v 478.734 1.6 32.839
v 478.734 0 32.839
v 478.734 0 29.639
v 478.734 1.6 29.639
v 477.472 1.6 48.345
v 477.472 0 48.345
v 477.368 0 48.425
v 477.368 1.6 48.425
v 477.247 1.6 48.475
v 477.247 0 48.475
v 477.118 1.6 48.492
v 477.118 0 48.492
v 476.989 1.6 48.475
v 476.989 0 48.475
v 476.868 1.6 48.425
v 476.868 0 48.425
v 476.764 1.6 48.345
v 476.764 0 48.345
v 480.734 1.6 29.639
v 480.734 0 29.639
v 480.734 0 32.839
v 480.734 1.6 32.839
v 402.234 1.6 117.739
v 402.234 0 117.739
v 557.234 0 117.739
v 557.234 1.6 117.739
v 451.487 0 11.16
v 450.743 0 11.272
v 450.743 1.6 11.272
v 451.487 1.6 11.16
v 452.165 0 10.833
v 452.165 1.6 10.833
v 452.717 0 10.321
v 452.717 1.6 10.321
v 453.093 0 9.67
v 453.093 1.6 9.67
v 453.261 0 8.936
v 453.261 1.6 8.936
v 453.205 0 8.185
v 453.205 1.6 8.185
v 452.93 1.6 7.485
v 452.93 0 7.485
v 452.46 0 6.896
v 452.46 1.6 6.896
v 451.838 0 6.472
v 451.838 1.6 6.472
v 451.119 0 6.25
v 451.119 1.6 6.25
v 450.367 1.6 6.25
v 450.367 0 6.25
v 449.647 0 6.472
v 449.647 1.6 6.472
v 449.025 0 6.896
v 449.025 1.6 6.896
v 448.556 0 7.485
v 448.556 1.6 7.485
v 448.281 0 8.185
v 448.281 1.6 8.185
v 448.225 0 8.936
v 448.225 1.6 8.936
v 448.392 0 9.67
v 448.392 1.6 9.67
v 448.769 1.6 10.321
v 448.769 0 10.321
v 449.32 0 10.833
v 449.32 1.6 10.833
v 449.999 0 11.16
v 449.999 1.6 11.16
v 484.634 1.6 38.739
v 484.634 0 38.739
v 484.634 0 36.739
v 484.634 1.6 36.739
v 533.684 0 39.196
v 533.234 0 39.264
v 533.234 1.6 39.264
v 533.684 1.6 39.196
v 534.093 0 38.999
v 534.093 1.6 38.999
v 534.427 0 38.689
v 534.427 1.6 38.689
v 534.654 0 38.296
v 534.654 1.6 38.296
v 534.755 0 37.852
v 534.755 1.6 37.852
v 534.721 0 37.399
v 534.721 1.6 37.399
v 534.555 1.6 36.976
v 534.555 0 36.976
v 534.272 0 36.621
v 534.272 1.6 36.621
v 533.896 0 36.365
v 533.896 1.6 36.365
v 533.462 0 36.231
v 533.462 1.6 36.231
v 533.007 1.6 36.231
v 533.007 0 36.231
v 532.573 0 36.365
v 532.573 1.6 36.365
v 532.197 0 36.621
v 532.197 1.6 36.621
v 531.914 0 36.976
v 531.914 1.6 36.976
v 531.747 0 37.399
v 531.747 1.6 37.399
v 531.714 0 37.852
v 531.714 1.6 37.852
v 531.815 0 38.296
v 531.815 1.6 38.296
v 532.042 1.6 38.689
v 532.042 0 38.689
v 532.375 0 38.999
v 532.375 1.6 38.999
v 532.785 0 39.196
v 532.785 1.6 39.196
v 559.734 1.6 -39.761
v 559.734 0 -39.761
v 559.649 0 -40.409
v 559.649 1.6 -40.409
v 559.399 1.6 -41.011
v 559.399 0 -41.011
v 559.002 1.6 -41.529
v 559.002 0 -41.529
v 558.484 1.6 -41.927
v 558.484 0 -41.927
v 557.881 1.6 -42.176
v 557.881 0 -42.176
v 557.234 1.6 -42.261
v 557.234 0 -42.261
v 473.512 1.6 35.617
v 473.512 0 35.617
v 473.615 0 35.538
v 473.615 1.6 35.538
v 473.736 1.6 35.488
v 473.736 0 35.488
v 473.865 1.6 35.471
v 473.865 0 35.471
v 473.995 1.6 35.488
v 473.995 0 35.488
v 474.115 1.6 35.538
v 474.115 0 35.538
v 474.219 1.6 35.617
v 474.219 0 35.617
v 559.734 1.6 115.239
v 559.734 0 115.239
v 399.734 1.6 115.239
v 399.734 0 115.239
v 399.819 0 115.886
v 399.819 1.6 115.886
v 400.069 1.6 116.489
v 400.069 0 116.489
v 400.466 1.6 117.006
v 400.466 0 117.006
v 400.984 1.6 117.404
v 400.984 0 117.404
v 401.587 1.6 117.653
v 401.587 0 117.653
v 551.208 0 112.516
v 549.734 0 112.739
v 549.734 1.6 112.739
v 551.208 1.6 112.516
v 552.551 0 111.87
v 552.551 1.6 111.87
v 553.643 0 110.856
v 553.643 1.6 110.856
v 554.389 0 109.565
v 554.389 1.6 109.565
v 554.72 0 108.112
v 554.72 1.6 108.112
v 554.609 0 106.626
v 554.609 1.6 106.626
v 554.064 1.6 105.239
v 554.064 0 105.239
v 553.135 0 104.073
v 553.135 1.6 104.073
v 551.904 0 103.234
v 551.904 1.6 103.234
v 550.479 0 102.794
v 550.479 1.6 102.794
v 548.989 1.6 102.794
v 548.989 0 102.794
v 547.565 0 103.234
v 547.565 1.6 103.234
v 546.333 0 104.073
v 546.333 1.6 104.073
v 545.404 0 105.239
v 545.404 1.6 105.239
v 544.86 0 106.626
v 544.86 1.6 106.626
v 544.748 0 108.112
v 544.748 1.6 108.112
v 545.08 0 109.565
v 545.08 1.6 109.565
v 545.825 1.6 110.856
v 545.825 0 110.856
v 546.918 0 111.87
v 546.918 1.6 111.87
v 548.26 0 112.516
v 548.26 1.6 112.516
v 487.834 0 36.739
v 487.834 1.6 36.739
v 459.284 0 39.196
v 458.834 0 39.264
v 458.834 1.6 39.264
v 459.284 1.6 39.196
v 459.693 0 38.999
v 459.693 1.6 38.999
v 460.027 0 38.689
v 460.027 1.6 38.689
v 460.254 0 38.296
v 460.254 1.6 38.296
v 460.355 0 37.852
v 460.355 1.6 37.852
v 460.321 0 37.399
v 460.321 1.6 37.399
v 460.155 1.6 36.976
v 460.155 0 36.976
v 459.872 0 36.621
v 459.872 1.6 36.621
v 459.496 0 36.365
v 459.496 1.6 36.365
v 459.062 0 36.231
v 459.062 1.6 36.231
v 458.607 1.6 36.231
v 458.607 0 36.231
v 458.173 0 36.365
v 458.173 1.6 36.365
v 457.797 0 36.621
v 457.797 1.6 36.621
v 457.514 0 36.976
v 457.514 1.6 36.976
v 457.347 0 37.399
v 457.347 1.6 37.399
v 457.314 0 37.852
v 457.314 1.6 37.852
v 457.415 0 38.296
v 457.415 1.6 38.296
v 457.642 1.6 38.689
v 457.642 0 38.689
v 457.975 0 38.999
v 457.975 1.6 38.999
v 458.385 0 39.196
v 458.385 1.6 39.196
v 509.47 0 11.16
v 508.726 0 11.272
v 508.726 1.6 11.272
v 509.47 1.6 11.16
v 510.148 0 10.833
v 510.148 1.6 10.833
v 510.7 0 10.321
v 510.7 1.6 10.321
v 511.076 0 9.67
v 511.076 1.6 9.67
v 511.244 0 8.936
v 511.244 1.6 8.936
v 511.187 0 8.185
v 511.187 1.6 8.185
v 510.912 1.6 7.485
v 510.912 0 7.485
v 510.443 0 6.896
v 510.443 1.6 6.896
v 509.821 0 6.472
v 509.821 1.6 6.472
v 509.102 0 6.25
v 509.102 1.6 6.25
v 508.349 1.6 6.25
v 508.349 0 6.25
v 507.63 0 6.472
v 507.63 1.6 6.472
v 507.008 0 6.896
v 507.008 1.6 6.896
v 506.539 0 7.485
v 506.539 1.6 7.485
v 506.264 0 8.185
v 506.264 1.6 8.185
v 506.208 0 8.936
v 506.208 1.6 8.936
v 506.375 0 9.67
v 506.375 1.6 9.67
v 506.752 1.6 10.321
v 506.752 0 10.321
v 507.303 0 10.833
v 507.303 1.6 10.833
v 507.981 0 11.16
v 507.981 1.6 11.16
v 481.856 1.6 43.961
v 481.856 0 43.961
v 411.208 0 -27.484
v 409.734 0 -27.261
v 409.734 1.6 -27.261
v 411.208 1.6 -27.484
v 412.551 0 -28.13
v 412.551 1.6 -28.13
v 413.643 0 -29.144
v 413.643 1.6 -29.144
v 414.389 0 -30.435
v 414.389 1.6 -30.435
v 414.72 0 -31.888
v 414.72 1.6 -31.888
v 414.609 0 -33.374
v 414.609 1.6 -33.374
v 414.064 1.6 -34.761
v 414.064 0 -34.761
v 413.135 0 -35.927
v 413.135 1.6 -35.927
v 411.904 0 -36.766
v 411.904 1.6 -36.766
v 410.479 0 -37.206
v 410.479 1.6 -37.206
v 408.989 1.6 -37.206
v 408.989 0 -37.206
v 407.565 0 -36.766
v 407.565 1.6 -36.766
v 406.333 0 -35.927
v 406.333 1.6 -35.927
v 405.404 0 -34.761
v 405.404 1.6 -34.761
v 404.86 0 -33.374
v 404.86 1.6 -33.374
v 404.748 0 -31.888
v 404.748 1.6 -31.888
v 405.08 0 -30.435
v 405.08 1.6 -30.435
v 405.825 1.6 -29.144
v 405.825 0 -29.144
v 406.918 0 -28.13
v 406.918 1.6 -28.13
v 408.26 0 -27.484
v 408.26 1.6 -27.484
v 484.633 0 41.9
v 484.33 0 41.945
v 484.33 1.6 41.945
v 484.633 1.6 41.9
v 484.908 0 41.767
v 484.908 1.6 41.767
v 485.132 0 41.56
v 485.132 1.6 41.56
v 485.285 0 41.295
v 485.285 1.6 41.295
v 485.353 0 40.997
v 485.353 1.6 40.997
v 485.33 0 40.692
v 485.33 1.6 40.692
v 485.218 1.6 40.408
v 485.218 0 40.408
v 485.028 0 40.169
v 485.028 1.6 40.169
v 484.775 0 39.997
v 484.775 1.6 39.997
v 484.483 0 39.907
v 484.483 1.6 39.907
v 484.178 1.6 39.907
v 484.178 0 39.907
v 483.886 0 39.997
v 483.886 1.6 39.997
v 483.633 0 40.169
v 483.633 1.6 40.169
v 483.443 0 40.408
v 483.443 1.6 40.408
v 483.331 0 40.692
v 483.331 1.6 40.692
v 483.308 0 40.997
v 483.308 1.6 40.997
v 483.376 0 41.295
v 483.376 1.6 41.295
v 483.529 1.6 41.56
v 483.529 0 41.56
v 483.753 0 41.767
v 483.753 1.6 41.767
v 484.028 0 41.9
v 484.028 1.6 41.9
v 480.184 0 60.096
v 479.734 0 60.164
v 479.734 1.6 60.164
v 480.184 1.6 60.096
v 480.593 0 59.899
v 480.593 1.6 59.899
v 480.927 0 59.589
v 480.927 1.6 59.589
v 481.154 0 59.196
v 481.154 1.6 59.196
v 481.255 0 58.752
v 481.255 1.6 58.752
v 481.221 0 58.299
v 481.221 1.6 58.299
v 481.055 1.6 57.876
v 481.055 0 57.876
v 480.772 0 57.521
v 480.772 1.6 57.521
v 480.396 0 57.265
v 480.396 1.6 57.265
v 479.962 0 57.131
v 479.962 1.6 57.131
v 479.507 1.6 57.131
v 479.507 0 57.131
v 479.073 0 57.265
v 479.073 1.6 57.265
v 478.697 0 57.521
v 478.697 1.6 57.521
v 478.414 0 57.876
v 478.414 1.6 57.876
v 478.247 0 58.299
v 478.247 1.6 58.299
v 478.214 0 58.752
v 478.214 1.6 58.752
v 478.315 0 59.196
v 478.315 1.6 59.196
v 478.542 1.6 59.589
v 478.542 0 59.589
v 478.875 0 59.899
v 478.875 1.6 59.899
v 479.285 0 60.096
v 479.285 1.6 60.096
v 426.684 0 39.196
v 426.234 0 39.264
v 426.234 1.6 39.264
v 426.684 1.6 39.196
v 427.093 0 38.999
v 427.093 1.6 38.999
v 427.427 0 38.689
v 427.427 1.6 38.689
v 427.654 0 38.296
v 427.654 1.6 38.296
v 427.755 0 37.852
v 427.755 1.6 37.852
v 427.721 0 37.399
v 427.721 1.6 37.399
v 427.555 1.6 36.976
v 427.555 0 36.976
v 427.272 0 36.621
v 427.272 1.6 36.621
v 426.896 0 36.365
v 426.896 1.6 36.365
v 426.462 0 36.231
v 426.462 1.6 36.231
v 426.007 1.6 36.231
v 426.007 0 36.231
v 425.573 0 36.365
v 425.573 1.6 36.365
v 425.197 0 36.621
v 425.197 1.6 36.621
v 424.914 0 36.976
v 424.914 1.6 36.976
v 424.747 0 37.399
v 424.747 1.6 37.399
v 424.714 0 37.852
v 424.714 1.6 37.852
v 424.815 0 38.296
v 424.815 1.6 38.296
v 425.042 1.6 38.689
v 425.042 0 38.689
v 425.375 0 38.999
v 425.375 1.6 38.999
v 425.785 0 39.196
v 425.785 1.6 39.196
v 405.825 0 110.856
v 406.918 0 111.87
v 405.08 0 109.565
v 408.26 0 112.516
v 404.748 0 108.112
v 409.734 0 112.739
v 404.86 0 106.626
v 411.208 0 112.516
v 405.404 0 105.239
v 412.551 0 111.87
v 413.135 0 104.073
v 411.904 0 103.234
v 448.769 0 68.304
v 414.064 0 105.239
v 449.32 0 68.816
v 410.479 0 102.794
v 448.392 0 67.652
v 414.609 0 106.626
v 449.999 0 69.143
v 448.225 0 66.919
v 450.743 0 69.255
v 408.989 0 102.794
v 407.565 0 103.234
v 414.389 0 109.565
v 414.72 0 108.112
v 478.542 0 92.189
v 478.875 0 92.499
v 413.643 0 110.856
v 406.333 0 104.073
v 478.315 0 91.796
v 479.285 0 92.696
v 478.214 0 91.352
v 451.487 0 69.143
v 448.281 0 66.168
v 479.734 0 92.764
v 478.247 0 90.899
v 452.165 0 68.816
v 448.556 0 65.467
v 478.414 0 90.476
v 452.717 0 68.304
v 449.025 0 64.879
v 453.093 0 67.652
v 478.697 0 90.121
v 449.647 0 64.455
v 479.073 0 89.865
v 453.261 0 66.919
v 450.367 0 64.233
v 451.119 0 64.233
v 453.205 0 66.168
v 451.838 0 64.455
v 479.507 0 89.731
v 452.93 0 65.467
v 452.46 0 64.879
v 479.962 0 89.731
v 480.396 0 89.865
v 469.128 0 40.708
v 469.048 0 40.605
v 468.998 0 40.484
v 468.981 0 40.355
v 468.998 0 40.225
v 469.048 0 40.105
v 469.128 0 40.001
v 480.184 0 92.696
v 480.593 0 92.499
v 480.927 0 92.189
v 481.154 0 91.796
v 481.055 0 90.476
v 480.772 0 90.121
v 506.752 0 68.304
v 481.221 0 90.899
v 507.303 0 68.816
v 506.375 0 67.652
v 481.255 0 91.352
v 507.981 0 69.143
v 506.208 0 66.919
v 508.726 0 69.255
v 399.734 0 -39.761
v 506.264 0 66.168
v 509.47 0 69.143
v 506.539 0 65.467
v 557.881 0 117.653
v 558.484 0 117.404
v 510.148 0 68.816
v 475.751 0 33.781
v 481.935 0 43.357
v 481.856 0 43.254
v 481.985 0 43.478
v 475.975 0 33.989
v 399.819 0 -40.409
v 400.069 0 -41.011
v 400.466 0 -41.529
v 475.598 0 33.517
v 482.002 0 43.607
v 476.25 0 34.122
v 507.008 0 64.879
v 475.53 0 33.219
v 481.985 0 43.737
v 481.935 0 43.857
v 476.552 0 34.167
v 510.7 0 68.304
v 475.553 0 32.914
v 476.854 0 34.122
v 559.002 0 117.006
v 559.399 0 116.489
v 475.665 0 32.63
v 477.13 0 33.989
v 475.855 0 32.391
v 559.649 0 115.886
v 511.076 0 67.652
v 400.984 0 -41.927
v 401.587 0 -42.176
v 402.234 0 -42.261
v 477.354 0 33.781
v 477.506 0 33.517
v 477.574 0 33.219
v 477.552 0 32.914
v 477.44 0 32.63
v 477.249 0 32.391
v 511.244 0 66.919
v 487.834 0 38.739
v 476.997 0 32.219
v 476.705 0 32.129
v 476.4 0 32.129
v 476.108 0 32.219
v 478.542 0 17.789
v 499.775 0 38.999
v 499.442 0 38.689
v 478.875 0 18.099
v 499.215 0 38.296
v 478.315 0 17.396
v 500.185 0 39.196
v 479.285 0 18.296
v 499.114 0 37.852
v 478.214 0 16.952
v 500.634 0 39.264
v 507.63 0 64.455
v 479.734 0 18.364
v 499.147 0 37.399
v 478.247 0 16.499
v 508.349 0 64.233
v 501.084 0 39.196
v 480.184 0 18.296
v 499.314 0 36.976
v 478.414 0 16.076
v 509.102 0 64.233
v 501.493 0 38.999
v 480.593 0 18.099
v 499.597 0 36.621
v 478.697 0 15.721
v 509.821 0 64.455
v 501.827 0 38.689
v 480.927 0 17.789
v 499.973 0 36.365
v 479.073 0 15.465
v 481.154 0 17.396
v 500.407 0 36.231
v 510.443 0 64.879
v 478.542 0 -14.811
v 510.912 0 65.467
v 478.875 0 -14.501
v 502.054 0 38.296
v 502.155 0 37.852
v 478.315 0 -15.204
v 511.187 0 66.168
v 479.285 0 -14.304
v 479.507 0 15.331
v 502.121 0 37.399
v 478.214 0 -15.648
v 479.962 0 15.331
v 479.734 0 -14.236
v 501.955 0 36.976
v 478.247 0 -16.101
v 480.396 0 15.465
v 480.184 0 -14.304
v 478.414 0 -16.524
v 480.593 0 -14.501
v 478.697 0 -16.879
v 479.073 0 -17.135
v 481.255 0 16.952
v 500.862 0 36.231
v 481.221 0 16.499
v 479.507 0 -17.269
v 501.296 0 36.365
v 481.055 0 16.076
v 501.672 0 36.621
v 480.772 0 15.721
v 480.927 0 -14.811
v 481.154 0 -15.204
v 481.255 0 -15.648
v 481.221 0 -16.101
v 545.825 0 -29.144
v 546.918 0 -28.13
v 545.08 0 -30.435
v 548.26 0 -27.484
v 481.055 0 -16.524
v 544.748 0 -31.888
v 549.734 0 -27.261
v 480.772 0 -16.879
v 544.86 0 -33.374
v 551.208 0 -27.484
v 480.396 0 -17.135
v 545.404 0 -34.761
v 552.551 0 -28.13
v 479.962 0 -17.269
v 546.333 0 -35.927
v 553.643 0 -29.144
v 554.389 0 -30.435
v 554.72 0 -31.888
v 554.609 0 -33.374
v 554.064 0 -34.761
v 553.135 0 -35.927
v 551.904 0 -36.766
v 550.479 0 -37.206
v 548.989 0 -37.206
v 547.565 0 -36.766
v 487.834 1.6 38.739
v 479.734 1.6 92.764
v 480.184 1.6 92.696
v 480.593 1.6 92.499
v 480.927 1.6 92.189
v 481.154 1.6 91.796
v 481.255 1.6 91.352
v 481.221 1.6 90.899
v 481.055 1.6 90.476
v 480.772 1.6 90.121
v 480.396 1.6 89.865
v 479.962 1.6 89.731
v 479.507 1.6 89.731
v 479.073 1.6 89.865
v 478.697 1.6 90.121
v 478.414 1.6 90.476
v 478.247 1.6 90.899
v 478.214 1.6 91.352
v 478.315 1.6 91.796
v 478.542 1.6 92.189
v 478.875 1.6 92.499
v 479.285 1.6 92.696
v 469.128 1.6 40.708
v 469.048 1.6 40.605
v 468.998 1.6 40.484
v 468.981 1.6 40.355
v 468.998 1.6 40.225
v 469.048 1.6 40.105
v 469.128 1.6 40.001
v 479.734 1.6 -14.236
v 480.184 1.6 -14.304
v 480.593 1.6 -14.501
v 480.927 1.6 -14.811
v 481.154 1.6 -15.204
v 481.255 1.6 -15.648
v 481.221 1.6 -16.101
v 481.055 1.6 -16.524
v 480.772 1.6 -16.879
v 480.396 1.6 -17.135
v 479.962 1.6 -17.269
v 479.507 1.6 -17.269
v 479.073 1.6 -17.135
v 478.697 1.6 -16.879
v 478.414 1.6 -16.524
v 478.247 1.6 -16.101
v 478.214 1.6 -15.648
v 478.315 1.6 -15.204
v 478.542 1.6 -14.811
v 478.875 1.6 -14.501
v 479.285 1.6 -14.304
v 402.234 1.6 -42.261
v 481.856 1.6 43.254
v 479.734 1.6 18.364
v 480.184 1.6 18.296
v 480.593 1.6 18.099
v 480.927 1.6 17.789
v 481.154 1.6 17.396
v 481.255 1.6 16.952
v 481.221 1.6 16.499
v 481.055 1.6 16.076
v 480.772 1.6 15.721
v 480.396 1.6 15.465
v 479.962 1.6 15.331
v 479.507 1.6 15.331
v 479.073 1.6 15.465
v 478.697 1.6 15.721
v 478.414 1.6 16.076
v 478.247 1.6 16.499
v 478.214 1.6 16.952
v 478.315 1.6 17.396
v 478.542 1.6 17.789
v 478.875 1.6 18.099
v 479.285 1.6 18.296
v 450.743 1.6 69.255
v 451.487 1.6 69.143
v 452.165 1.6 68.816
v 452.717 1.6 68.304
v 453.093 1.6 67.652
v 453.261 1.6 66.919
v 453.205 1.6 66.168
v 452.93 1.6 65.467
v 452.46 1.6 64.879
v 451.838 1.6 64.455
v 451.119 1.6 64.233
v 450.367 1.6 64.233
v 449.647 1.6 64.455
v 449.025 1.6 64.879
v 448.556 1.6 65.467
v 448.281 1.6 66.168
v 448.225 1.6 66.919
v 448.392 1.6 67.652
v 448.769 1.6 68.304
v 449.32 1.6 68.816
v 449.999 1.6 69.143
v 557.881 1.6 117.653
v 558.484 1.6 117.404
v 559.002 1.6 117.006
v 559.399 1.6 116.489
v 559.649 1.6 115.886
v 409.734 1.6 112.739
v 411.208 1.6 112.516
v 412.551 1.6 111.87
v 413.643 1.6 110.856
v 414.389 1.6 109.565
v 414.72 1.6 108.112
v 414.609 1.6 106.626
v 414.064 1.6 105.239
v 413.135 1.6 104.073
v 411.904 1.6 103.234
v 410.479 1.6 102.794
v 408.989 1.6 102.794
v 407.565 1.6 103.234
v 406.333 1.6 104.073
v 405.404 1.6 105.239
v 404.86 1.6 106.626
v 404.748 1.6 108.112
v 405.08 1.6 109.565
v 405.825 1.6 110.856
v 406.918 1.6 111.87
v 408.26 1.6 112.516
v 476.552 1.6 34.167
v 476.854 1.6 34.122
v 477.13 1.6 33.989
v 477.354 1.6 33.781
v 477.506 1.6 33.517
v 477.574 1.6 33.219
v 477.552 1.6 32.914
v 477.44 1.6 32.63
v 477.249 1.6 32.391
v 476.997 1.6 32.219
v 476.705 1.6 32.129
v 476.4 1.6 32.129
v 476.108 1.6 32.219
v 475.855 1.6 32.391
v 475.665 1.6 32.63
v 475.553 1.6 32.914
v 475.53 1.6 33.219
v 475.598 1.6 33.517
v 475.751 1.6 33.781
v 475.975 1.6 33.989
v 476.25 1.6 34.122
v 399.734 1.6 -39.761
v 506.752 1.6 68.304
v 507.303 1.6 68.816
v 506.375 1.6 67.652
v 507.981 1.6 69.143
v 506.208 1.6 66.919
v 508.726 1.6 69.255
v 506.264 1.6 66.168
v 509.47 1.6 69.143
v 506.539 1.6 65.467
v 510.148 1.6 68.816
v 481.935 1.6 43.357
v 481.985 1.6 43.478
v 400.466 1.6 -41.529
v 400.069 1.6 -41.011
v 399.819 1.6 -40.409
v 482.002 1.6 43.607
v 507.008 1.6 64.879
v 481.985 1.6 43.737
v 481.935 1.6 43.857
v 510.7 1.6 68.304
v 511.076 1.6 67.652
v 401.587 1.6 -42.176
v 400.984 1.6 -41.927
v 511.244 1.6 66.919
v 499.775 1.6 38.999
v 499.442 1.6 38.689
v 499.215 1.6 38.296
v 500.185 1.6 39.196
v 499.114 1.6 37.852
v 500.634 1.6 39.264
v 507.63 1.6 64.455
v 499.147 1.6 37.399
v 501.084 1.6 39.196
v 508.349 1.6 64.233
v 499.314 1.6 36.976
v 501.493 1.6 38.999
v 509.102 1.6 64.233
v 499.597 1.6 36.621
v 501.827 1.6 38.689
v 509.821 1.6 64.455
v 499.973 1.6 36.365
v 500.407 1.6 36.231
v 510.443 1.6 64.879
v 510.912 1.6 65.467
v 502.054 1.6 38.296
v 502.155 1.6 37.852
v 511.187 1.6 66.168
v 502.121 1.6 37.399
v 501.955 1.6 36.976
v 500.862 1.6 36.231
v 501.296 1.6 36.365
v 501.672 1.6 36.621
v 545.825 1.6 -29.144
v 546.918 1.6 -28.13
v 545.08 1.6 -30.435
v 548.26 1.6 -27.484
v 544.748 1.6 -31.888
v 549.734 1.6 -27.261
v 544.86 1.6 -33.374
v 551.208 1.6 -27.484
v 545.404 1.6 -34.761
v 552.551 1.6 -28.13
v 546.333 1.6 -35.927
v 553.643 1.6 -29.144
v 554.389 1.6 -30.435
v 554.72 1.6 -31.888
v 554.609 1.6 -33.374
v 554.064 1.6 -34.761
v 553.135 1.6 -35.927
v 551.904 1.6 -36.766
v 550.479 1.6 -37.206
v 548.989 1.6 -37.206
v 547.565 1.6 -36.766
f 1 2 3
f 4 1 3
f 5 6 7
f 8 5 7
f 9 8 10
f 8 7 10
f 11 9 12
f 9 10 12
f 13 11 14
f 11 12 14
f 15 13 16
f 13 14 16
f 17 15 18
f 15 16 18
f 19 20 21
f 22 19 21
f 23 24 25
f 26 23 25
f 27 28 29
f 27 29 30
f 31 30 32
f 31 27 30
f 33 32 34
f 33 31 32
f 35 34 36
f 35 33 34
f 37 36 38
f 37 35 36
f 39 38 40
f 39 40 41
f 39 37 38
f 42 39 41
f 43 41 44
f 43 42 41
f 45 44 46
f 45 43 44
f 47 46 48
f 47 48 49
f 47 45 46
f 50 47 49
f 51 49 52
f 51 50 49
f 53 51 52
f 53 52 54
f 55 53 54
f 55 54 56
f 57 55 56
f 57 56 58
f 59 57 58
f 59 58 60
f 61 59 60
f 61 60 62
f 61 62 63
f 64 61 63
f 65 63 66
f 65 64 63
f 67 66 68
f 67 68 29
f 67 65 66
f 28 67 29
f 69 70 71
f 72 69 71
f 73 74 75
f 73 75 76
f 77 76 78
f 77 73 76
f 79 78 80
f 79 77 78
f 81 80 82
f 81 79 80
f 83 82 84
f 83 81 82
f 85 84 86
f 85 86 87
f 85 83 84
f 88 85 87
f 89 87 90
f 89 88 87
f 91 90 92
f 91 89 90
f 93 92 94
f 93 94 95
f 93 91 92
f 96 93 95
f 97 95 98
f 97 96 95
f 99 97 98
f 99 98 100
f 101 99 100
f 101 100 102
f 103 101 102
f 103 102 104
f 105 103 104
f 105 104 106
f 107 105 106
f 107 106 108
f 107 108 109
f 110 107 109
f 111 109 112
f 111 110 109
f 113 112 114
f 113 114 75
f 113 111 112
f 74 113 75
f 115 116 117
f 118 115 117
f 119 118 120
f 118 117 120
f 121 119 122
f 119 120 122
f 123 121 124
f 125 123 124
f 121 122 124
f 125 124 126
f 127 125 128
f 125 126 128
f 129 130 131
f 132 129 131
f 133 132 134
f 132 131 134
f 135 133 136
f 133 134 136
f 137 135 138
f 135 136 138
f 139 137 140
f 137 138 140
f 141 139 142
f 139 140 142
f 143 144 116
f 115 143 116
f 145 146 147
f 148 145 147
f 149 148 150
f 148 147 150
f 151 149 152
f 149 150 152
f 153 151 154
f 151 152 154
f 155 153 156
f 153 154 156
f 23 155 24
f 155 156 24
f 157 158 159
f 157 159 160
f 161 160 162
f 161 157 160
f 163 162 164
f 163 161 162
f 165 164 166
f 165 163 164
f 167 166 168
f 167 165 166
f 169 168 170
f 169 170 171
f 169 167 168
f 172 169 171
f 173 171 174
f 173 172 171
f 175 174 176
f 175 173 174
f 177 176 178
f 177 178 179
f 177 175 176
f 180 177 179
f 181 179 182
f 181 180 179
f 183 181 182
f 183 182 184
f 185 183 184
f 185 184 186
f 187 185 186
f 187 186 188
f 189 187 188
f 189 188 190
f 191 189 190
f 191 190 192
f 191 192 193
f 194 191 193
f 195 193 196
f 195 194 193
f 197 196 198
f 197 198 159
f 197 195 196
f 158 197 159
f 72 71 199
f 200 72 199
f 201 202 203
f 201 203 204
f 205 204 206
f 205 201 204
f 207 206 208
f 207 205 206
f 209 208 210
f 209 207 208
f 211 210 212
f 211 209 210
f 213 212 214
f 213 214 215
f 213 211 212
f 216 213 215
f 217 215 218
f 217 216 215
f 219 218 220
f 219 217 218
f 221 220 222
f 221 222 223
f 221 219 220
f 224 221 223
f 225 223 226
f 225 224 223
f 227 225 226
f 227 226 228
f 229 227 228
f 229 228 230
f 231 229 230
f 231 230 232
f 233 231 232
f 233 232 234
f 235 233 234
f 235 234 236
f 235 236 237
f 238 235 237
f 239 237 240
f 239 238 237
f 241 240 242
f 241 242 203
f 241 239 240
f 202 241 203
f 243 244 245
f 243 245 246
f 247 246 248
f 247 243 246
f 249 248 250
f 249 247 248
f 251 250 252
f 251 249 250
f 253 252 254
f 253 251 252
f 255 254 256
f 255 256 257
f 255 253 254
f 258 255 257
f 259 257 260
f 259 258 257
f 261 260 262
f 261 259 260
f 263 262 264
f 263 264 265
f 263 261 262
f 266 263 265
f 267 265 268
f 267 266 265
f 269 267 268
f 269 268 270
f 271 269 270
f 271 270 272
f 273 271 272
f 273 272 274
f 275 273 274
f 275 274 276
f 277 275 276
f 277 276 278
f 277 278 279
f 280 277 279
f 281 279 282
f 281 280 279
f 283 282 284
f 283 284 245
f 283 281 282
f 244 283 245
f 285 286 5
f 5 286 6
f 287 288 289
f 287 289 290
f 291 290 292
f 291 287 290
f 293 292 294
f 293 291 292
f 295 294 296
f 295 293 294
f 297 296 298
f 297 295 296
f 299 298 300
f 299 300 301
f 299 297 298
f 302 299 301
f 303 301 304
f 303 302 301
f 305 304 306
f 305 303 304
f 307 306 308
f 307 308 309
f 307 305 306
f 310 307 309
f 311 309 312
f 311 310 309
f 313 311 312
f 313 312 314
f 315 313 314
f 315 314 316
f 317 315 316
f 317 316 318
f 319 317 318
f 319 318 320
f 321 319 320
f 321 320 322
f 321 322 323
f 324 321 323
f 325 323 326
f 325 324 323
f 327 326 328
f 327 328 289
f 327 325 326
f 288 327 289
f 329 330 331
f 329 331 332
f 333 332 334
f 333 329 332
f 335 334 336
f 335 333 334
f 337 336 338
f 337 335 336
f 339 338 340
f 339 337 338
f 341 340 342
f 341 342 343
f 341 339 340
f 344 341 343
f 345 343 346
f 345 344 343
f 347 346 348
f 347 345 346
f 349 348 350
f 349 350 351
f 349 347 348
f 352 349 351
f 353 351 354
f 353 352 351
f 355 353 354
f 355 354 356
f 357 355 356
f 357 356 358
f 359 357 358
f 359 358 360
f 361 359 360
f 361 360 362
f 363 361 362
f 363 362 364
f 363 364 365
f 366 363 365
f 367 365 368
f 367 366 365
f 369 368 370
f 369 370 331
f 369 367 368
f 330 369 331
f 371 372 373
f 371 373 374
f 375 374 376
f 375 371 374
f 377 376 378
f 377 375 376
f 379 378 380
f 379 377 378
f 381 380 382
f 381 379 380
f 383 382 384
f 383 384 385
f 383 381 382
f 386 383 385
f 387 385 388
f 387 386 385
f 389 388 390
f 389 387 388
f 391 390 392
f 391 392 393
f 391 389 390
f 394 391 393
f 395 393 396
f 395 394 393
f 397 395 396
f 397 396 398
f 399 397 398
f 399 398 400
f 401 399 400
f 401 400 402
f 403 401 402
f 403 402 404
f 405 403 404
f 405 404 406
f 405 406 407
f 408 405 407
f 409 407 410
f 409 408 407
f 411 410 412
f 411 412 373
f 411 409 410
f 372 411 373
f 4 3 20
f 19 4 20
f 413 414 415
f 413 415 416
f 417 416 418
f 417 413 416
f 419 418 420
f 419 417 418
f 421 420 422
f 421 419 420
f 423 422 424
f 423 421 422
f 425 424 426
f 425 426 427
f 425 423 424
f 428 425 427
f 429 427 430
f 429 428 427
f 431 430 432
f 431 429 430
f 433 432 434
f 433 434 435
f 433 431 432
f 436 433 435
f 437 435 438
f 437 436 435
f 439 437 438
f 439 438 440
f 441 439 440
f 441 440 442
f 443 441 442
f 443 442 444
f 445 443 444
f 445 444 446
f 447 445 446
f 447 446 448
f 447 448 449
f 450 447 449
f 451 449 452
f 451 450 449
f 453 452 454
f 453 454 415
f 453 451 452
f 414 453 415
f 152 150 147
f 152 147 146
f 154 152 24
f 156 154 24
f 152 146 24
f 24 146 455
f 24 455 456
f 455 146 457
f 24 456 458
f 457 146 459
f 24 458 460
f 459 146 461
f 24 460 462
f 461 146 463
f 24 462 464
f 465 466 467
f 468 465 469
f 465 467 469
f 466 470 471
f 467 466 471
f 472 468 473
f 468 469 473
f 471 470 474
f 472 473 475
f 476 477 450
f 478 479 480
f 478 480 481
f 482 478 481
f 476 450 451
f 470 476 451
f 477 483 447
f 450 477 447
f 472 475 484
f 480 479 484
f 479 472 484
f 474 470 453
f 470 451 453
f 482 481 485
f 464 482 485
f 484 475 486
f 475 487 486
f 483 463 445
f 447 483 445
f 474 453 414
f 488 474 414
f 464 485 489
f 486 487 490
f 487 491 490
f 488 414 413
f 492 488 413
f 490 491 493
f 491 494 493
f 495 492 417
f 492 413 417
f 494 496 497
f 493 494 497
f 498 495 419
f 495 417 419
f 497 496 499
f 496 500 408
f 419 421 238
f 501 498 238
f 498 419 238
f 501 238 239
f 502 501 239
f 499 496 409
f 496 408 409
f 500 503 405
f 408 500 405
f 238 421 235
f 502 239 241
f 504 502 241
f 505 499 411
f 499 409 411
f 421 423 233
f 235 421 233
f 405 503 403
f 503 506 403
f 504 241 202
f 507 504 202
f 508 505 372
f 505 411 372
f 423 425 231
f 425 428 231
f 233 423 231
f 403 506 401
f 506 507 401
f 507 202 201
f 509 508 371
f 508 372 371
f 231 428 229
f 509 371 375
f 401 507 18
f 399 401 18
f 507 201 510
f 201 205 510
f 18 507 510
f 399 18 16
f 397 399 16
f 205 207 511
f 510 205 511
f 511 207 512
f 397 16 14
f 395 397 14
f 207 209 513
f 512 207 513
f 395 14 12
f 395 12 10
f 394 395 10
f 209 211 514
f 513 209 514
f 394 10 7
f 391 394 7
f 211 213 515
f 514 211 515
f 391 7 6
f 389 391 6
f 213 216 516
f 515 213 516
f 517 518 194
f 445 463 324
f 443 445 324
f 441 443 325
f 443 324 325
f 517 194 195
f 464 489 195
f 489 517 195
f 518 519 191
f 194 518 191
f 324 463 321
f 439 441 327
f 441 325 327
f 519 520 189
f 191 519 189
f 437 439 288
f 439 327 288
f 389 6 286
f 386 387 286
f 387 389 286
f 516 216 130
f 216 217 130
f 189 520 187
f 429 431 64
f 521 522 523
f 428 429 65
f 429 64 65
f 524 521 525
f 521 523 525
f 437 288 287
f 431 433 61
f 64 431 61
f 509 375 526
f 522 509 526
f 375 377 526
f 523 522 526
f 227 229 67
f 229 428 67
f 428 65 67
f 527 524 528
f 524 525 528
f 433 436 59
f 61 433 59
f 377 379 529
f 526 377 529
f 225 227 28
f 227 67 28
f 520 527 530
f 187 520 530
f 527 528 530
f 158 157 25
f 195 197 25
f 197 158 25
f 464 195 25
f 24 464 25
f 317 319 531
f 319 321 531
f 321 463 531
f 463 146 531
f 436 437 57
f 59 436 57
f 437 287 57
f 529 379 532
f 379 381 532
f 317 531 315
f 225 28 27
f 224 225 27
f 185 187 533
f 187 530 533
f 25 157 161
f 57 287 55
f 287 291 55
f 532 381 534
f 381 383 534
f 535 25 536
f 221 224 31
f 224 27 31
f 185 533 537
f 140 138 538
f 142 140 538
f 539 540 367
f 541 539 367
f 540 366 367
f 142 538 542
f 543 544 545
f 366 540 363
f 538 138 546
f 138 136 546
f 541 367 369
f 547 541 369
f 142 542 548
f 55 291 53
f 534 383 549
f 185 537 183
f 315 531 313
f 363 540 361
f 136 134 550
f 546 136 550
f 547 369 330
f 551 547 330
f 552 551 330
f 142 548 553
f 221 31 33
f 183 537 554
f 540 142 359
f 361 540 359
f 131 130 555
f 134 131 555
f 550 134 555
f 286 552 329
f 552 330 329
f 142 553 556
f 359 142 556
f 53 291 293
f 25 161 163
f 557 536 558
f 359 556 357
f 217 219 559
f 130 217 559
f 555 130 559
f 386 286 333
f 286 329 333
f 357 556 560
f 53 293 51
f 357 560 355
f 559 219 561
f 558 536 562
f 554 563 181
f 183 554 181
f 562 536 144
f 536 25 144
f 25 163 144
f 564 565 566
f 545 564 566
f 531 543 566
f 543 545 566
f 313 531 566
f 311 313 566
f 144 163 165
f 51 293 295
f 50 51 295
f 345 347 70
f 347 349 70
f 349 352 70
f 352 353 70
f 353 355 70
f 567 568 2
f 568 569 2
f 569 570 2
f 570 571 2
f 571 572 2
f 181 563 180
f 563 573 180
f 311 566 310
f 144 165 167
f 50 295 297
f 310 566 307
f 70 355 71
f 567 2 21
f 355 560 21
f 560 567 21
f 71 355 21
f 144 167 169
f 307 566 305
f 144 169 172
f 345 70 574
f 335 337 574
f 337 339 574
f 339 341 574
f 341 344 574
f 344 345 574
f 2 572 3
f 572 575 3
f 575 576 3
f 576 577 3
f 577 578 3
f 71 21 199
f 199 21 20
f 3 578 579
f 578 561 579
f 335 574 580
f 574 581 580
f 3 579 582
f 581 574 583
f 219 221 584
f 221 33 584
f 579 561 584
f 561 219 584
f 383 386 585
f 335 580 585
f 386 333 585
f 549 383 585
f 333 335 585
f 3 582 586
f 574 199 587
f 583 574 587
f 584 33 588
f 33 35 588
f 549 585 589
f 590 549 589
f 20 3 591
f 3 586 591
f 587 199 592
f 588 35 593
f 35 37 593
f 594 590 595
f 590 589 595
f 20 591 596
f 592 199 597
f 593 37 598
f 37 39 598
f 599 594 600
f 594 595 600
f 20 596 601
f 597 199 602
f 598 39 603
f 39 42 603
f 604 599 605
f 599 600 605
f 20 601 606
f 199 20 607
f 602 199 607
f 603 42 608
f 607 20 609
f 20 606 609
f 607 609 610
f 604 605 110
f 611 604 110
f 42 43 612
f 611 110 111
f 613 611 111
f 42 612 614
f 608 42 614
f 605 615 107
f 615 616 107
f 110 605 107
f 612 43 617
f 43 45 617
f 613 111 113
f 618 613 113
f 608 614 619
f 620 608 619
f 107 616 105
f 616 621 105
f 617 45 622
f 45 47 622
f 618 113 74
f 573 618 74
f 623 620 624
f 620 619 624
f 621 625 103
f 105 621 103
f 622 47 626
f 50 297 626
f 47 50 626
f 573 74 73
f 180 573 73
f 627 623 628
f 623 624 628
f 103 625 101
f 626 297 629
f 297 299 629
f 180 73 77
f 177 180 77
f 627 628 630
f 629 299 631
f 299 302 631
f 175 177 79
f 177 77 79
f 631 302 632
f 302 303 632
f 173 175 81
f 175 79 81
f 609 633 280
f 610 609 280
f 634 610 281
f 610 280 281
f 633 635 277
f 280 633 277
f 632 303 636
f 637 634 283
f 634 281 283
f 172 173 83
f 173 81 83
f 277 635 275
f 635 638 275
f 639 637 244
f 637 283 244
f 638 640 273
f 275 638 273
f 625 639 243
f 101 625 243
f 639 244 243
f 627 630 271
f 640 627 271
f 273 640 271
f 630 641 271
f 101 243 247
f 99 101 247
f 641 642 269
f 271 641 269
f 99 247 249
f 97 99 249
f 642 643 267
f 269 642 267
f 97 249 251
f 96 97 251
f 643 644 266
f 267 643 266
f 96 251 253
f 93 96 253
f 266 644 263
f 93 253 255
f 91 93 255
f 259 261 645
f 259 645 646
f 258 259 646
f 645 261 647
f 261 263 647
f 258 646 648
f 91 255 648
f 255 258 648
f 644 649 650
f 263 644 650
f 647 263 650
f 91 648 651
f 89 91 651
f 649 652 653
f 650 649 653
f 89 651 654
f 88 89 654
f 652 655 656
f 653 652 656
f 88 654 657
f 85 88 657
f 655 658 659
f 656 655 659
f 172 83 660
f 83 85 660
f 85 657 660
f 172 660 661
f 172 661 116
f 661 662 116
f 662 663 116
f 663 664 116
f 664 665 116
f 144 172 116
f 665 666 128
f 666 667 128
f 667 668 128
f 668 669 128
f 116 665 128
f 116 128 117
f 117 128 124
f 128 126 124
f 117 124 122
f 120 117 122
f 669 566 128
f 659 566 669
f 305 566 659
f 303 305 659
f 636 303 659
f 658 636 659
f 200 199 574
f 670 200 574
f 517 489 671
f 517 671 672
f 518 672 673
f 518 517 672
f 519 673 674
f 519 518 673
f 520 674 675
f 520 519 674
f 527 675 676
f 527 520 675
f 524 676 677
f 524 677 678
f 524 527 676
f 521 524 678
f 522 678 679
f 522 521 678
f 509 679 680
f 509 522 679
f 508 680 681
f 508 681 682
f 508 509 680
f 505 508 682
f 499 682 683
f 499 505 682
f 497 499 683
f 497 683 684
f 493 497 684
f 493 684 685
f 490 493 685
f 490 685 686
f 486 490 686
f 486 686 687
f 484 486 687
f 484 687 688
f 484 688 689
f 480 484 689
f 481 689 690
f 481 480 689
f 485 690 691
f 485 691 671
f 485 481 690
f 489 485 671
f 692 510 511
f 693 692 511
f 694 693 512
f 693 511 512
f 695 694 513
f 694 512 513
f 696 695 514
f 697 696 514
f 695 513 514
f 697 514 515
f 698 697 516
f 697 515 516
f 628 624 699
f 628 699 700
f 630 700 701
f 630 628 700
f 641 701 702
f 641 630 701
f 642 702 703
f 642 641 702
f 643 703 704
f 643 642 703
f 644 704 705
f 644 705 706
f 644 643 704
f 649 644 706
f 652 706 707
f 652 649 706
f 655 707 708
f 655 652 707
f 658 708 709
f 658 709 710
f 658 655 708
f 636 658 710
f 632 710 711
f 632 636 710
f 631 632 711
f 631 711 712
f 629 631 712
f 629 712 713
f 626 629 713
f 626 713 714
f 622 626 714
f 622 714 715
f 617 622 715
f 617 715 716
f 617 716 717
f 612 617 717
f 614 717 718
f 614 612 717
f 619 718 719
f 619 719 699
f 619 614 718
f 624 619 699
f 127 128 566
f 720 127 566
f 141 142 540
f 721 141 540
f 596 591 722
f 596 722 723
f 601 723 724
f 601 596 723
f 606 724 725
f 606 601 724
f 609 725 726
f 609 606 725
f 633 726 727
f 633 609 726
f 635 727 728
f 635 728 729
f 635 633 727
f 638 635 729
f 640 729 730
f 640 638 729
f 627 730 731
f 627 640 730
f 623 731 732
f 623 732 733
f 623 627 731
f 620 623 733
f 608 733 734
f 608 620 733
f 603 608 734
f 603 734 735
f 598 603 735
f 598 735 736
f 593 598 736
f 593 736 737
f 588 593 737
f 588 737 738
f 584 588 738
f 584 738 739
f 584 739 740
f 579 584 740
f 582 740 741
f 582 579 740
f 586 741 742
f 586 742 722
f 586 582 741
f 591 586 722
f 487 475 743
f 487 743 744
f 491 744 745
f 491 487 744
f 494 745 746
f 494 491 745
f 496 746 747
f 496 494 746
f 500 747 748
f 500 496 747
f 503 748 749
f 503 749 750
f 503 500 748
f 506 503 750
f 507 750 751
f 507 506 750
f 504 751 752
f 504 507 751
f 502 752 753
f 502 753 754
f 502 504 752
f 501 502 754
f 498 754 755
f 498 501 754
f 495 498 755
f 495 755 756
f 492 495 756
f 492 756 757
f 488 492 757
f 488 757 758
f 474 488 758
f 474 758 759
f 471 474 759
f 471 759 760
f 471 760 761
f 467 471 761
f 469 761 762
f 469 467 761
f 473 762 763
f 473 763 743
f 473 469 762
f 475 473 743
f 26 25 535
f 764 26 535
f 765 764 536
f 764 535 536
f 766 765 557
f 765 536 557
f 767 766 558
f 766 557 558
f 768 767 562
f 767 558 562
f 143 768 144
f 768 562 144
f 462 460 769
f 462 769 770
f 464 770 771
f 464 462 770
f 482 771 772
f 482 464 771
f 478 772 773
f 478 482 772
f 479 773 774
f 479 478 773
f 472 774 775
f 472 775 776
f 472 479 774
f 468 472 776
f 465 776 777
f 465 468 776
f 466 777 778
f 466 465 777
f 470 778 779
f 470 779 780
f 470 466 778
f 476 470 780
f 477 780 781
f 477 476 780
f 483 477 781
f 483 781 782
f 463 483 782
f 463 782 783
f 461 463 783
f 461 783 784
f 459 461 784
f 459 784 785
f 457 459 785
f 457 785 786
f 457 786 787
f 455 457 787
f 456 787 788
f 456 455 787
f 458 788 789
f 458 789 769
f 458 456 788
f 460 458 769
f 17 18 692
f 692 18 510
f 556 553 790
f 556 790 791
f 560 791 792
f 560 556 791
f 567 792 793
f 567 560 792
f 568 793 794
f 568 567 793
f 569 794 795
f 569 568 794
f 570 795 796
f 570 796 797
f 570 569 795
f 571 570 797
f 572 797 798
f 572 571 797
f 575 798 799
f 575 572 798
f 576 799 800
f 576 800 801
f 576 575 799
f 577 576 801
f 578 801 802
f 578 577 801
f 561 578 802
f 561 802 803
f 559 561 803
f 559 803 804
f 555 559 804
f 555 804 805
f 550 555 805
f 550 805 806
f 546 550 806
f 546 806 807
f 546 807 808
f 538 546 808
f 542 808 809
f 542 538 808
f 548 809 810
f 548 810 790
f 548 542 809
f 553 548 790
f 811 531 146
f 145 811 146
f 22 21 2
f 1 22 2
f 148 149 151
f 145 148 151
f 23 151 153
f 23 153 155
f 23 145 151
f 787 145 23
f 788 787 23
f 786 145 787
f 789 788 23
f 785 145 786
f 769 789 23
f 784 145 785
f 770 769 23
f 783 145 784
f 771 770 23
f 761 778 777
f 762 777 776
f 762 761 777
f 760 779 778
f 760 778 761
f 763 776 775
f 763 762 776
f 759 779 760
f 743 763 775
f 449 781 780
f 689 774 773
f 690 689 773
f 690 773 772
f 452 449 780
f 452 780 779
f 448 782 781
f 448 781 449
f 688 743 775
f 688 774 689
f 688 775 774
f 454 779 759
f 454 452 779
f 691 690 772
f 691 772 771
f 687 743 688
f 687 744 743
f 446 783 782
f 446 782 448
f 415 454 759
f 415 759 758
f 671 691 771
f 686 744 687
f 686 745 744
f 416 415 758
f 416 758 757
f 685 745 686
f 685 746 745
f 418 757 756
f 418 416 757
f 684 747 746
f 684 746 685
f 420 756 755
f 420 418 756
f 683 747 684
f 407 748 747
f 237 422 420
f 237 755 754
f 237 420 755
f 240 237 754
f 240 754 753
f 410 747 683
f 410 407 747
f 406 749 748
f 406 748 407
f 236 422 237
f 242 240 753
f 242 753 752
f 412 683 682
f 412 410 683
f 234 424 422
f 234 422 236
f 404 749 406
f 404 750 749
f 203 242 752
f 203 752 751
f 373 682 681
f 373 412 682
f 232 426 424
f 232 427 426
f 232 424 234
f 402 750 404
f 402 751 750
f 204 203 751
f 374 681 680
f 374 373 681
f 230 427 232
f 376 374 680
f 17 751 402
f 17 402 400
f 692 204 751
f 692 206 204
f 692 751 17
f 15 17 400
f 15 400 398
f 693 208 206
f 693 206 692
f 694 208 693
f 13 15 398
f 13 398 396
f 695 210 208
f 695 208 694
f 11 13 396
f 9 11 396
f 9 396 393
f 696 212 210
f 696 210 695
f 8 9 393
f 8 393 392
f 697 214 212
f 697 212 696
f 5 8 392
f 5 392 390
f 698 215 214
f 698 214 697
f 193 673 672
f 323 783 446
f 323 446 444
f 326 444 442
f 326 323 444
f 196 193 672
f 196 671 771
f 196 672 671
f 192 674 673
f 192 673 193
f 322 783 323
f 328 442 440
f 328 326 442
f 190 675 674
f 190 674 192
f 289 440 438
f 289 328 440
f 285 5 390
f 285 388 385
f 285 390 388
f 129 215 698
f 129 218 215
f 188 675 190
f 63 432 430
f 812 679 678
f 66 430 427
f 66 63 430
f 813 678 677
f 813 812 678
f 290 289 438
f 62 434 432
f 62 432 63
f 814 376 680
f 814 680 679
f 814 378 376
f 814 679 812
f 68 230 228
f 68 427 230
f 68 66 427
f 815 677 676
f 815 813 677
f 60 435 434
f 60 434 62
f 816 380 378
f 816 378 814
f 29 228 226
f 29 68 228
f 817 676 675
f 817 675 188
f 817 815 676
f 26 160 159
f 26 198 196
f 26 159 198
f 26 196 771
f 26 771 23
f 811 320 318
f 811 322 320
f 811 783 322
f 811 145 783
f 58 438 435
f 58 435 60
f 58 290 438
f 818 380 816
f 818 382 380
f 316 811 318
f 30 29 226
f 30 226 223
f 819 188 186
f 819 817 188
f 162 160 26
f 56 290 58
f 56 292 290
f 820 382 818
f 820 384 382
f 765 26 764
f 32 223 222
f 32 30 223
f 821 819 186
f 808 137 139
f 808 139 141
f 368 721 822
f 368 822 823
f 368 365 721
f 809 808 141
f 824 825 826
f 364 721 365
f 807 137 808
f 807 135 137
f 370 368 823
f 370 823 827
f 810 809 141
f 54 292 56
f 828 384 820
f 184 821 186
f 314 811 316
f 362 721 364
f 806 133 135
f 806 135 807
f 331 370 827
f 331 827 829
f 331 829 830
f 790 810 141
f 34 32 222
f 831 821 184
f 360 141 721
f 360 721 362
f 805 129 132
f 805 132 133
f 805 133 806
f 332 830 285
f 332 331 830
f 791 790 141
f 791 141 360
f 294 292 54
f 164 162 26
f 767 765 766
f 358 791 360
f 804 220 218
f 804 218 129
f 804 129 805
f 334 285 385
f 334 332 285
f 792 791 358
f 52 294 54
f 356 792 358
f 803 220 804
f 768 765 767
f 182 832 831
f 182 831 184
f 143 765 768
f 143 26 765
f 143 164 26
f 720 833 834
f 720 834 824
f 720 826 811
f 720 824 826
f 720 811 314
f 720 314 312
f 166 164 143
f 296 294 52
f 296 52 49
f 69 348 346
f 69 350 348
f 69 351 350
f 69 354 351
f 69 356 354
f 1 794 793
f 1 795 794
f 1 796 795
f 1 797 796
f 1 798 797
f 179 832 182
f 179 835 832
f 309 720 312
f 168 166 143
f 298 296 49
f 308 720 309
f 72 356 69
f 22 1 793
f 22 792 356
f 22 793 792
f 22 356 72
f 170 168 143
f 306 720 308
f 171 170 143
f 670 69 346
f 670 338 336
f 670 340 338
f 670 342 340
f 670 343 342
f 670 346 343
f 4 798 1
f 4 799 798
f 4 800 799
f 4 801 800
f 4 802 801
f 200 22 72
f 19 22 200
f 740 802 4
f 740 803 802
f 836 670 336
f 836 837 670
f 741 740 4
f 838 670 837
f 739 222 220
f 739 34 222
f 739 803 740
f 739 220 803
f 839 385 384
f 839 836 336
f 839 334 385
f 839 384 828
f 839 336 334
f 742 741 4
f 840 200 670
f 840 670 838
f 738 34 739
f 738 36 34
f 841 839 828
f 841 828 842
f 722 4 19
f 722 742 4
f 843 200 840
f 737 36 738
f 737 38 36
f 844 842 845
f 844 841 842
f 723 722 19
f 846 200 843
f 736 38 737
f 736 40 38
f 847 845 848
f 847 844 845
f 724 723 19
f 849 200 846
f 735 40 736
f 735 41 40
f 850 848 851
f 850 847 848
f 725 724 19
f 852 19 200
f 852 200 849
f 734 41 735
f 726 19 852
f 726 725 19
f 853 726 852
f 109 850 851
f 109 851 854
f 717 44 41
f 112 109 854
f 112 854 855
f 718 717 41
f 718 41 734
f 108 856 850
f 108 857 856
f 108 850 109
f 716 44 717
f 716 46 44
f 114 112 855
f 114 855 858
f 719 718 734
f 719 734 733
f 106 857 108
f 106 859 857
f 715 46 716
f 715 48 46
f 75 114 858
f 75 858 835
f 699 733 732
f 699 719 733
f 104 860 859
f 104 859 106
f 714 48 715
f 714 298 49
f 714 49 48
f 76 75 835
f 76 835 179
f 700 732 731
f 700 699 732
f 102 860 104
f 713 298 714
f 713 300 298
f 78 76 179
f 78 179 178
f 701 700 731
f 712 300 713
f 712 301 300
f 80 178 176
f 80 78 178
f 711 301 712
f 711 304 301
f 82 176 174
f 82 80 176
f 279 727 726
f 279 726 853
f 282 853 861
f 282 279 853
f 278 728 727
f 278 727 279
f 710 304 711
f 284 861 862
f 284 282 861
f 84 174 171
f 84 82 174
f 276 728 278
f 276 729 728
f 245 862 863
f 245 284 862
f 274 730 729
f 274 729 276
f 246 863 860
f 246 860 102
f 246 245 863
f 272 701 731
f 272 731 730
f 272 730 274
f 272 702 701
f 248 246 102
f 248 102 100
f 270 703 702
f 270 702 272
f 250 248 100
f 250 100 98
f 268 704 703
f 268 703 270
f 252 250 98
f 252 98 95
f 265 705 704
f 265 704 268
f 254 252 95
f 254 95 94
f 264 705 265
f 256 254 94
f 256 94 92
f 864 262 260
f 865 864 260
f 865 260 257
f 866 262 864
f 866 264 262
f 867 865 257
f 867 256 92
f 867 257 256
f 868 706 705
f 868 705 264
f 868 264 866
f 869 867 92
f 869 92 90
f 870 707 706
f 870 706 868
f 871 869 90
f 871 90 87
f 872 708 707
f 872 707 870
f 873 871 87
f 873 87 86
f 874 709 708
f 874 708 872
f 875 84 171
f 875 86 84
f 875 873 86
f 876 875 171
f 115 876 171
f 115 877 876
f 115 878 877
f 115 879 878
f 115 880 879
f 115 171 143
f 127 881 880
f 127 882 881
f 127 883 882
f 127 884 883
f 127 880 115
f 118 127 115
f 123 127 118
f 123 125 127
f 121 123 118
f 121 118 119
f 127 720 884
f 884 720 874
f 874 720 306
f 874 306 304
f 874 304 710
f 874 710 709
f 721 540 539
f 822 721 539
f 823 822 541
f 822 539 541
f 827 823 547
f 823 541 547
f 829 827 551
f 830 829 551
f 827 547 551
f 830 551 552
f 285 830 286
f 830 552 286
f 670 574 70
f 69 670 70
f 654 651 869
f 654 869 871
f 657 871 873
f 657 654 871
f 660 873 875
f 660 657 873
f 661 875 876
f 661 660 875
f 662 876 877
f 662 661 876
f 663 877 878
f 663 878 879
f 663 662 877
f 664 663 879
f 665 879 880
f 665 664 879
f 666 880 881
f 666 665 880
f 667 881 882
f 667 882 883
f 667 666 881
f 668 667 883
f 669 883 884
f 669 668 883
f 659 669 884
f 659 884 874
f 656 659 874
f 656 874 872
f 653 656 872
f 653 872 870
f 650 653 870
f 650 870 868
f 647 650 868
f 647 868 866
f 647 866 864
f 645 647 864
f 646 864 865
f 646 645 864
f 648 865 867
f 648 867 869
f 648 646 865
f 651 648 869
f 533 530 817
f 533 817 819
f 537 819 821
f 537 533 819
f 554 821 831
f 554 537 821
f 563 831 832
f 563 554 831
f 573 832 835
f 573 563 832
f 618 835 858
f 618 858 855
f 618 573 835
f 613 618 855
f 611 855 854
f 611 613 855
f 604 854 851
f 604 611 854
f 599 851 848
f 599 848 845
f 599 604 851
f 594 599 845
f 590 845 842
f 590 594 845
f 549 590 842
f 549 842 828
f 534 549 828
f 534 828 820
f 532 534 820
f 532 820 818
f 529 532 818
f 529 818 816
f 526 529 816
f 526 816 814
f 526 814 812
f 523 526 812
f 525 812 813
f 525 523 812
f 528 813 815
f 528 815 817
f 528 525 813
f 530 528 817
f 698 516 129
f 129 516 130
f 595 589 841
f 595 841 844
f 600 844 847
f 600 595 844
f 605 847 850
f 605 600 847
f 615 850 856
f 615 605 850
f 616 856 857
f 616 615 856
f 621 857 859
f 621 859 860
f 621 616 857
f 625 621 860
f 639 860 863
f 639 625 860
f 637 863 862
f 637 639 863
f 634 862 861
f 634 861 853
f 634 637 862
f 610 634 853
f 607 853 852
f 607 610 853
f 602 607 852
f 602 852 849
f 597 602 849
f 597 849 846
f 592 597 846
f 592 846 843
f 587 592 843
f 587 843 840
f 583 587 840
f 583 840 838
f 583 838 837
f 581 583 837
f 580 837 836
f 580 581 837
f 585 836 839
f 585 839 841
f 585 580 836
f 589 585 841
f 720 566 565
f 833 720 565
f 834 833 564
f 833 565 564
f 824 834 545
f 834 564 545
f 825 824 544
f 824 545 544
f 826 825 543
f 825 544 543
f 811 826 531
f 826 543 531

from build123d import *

# Parameters (mm, degrees)
SKETCH1_R           = 5
SKETCH1_R_2         = 1.525
SKETCH1_R_3         = 2.525
SKETCH1_R_4         = 1.025
BOSS_EXTRUDE1_DEPTH = 1.6


with BuildPart() as part:
    # Sketch1 → Boss-Extrude1 (new body)
    with BuildSketch(Plane(origin=(0, 0, 0), x_dir=(1, 0, 0), z_dir=(0, 1, 0))):
        with BuildLine():
            Line((557.234258902, 42.261494271), (402.234258902, 42.261494271))
            ThreePointArc((402.234258902, 42.261494271), (400.466491949, 41.529261224), (399.734258902, 39.761494271))
            Line((399.734258902, 39.761494271), (399.734258902, -115.238505729))
            ThreePointArc((399.734258902, -115.238505729), (400.466491949, -117.006272682), (402.234258902, -117.738505729))
            Line((402.234258902, -117.738505729), (557.234258902, -117.738505729))
            ThreePointArc((557.234258902, -117.738505729), (559.002025855, -117.006272682), (559.734258902, -115.238505729))
            Line((559.734258902, -115.238505729), (559.734258902, 39.761494271))
            ThreePointArc((559.734258902, 39.761494271), (559.002025855, 41.529261224), (557.234258902, 42.261494271))
        make_face()
        with Locations(Location((409.734258902, -107.738505729, 0), (0, 0, 270))):
            Circle(SKETCH1_R, mode=Mode.SUBTRACT)
        with Locations(Location((479.734258902, -91.238505729, 0), (0, 0, 270))):
            Circle(SKETCH1_R_2, mode=Mode.SUBTRACT)
        with Locations(Location((450.742880873, -66.729883758, 0), (0, 0, 270))):
            Circle(SKETCH1_R_3, mode=Mode.SUBTRACT)
        with Locations(Location((479.734258902, -58.638505729, 0), (0, 0, 270))):
            Circle(SKETCH1_R_2, mode=Mode.SUBTRACT)
        with BuildLine():
            Line((474.218826009, -35.617185386), (481.855579245, -43.253938622))
            ThreePointArc((481.855579245, -43.253938622), (482.002025855, -43.607492013), (481.855579245, -43.961045404))
            Line((481.855579245, -43.961045404), (477.471517202, -48.345107447))
            ThreePointArc((477.471517202, -48.345107447), (477.117963811, -48.491554056), (476.764410421, -48.345107447))
            Line((476.764410421, -48.345107447), (469.127657184, -40.70835421))
            ThreePointArc((469.127657184, -40.70835421), (468.981210575, -40.35480082), (469.127657184, -40.001247429))
            Line((469.127657184, -40.001247429), (473.511719227, -35.617185386))
            ThreePointArc((473.511719227, -35.617185386), (473.865272618, -35.470738776), (474.218826009, -35.617185386))
        make_face(mode=Mode.SUBTRACT)
        with Locations(Location((549.734258902, -107.738505729, 0), (0, 0, 270))):
            Circle(SKETCH1_R, mode=Mode.SUBTRACT)
        with Locations(Location((508.725636931, -66.729883758, 0), (0, 0, 270))):
            Circle(SKETCH1_R_3, mode=Mode.SUBTRACT)
        with Locations(Location((484.33045298, -40.920486245, 0), (0, 0, 270))):
            Circle(SKETCH1_R_4, mode=Mode.SUBTRACT)
        with Locations(Location((426.234258902, -37.738505729, 0), (0, 0, 270))):
            Circle(SKETCH1_R_2, mode=Mode.SUBTRACT)
        with Locations(Location((458.834258902, -37.738505729, 0), (0, 0, 270))):
            Circle(SKETCH1_R_2, mode=Mode.SUBTRACT)
        with Locations(Location((476.552278387, -33.142311651, 0), (0, 0, 270))):
            Circle(SKETCH1_R_4, mode=Mode.SUBTRACT)
        Polygon((480.734258902, -32.838505729), (479.734258902, -32.838505729), (478.734258902, -32.838505729), (478.734258902, -29.638505729), (480.734258902, -29.638505729), align=None, mode=Mode.SUBTRACT)
        with Locations(Location((450.742880873, -8.747127701, 0), (0, 0, 270))):
            Circle(SKETCH1_R_3, mode=Mode.SUBTRACT)
        with Locations(Location((479.734258902, -16.838505729, 0), (0, 0, 270))):
            Circle(SKETCH1_R_2, mode=Mode.SUBTRACT)
        with Locations(Location((409.734258902, 32.261494271, 0), (0, 0, 270))):
            Circle(SKETCH1_R, mode=Mode.SUBTRACT)
        with Locations(Location((479.734258902, 15.761494271, 0), (0, 0, 270))):
            Circle(SKETCH1_R_2, mode=Mode.SUBTRACT)
        Polygon((484.634258902, -38.738505729), (484.634258902, -37.738505729), (484.634258902, -36.738505729), (487.834258902, -36.738505729), (487.834258902, -38.738505729), align=None, mode=Mode.SUBTRACT)
        with Locations(Location((500.634258902, -37.738505729, 0), (0, 0, 270))):
            Circle(SKETCH1_R_2, mode=Mode.SUBTRACT)
        with Locations(Location((508.725636931, -8.747127701, 0), (0, 0, 270))):
            Circle(SKETCH1_R_3, mode=Mode.SUBTRACT)
        with Locations(Location((533.234258902, -37.738505729, 0), (0, 0, 270))):
            Circle(SKETCH1_R_2, mode=Mode.SUBTRACT)
        with Locations(Location((549.734258902, 32.261494271, 0), (0, 0, 270))):
            Circle(SKETCH1_R, mode=Mode.SUBTRACT)
    extrude(amount=BOSS_EXTRUDE1_DEPTH)


solid = part.part
